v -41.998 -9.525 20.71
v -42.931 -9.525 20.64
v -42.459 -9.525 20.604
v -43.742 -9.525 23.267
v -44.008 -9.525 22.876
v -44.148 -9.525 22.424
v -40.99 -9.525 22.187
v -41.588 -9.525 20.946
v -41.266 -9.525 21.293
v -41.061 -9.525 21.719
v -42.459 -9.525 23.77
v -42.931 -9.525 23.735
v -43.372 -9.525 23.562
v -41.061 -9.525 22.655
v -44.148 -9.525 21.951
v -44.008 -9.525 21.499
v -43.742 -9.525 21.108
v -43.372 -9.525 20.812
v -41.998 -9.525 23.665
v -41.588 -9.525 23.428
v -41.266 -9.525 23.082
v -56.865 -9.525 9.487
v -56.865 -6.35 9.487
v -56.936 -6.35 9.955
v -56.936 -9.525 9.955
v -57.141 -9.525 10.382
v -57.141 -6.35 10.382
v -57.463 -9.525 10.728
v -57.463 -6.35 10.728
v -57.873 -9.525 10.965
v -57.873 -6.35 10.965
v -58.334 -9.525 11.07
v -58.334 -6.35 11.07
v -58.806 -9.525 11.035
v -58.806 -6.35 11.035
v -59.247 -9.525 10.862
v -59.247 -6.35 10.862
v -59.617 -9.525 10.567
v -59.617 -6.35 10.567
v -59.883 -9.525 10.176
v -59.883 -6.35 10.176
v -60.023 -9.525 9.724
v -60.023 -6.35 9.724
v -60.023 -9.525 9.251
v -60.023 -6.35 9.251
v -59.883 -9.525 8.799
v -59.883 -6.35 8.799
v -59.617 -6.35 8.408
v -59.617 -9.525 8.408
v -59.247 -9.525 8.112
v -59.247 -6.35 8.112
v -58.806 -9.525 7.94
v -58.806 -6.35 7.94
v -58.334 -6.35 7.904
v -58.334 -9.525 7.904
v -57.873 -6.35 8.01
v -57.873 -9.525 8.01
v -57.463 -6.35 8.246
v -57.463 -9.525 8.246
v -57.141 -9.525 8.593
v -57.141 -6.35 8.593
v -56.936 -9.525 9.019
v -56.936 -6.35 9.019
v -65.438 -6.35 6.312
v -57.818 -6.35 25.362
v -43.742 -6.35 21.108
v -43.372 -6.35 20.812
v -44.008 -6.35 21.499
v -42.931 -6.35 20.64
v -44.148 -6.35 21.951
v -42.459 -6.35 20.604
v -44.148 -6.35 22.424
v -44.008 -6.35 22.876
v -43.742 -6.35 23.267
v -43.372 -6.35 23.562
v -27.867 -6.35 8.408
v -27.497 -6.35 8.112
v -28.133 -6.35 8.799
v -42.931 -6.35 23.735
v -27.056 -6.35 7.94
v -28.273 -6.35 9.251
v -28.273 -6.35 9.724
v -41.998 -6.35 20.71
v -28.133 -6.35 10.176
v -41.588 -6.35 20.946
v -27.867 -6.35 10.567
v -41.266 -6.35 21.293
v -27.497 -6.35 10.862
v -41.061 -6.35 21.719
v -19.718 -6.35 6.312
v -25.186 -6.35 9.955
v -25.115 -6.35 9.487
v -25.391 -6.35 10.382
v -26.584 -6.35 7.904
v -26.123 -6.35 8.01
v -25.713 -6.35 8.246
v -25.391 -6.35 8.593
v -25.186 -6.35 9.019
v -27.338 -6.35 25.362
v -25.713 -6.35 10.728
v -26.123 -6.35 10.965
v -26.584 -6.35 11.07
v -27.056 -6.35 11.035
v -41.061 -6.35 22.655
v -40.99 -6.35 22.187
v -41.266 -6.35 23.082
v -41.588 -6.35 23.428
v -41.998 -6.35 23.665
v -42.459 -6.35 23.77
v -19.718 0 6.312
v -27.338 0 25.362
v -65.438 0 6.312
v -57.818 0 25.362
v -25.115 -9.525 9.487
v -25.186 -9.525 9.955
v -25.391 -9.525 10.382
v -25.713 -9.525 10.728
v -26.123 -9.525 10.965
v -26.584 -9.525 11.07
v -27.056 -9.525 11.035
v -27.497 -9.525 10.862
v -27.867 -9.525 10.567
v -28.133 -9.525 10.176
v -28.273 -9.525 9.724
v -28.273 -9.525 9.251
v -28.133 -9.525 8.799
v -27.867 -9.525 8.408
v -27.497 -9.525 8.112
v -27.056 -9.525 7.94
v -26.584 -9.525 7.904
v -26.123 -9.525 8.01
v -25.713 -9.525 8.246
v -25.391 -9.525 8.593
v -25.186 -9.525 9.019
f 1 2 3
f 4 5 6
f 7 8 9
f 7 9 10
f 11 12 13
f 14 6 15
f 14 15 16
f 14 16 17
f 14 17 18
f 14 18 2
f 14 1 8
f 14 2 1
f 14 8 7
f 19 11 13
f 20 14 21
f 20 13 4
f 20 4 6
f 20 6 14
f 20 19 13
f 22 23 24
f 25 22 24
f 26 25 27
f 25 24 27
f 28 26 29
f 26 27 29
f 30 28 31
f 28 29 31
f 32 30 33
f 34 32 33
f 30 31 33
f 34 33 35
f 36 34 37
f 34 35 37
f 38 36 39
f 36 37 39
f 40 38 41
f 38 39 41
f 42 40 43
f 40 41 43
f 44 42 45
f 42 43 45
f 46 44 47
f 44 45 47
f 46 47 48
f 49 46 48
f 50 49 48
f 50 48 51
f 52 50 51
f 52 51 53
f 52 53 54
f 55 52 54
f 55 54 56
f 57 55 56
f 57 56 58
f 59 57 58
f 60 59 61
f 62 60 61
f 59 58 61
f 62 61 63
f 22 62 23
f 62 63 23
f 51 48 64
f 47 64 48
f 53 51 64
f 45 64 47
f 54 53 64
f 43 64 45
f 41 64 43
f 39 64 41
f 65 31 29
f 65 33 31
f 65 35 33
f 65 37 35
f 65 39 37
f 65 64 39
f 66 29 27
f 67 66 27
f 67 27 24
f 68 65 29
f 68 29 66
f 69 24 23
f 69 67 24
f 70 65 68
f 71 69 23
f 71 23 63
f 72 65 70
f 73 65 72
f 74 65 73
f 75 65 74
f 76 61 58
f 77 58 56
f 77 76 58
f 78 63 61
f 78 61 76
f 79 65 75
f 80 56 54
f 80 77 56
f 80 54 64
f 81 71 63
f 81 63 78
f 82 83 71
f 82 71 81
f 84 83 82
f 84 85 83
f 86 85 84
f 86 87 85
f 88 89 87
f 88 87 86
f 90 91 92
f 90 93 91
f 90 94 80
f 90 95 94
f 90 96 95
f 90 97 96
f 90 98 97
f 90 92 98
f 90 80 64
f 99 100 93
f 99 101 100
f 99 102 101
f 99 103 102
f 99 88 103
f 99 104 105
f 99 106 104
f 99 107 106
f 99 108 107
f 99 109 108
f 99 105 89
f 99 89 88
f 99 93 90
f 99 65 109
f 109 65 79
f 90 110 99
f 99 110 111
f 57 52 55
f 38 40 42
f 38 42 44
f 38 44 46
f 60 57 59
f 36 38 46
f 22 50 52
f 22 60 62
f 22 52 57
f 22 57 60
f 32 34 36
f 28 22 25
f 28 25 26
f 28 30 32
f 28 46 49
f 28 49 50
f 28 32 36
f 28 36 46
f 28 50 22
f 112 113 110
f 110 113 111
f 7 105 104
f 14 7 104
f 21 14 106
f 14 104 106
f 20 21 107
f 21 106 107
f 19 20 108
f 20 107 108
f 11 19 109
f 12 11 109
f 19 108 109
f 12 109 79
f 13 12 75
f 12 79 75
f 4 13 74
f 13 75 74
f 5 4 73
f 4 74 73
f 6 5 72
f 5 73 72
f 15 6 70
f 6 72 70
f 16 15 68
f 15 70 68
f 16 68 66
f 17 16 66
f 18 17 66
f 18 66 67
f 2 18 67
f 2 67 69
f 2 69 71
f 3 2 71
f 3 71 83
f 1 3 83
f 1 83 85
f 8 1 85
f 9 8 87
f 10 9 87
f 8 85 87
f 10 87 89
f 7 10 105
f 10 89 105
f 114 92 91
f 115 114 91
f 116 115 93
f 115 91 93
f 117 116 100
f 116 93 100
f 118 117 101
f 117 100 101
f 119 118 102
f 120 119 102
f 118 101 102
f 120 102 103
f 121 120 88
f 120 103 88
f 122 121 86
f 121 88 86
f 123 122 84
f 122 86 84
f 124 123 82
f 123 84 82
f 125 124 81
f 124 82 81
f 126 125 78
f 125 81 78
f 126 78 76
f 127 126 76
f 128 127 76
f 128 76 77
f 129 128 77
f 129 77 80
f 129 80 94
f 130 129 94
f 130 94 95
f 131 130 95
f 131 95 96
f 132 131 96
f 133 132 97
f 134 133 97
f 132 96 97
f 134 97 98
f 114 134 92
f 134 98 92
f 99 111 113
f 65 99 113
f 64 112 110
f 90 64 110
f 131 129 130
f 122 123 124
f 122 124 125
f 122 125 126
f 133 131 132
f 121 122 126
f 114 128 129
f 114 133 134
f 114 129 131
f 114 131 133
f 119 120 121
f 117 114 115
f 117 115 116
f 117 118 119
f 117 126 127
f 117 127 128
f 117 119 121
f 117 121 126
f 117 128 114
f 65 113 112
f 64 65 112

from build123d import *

# Parameters (mm, degrees)
F1_DEPTH = 6.35
F2_R     = 1.5875
F3_DEPTH = 3.175


# Not quite as in the source:
# - a feature of the source that left no trace in its solid (it failed there, or was rolled back) is left out


with BuildPart() as f1:
    # F0 (on Front) → F1 (new body)
    with BuildSketch(Plane.XZ):
        Polygon((-57.817878572, 25.3623127937), (-65.437878572, 6.3123127937), (-19.717878572, 6.3123127937), (-27.337878572, 25.3623127937), (-42.577878572, 25.3623127937), align=None)
    extrude(amount=F1_DEPTH)

    # F2 (on face) → F3 (join)
    with BuildSketch(Plane.XZ.offset(6.35)):
        with Locations((-58.452878572, 9.4873127937)):
            Circle(F2_R)
        with Locations((-26.702878572, 9.4873127937)):
            Circle(F2_R)
        with Locations((-42.577878572, 22.1873127937)):
            Circle(F2_R)
    extrude(amount=F3_DEPTH)


solid = f1.part
